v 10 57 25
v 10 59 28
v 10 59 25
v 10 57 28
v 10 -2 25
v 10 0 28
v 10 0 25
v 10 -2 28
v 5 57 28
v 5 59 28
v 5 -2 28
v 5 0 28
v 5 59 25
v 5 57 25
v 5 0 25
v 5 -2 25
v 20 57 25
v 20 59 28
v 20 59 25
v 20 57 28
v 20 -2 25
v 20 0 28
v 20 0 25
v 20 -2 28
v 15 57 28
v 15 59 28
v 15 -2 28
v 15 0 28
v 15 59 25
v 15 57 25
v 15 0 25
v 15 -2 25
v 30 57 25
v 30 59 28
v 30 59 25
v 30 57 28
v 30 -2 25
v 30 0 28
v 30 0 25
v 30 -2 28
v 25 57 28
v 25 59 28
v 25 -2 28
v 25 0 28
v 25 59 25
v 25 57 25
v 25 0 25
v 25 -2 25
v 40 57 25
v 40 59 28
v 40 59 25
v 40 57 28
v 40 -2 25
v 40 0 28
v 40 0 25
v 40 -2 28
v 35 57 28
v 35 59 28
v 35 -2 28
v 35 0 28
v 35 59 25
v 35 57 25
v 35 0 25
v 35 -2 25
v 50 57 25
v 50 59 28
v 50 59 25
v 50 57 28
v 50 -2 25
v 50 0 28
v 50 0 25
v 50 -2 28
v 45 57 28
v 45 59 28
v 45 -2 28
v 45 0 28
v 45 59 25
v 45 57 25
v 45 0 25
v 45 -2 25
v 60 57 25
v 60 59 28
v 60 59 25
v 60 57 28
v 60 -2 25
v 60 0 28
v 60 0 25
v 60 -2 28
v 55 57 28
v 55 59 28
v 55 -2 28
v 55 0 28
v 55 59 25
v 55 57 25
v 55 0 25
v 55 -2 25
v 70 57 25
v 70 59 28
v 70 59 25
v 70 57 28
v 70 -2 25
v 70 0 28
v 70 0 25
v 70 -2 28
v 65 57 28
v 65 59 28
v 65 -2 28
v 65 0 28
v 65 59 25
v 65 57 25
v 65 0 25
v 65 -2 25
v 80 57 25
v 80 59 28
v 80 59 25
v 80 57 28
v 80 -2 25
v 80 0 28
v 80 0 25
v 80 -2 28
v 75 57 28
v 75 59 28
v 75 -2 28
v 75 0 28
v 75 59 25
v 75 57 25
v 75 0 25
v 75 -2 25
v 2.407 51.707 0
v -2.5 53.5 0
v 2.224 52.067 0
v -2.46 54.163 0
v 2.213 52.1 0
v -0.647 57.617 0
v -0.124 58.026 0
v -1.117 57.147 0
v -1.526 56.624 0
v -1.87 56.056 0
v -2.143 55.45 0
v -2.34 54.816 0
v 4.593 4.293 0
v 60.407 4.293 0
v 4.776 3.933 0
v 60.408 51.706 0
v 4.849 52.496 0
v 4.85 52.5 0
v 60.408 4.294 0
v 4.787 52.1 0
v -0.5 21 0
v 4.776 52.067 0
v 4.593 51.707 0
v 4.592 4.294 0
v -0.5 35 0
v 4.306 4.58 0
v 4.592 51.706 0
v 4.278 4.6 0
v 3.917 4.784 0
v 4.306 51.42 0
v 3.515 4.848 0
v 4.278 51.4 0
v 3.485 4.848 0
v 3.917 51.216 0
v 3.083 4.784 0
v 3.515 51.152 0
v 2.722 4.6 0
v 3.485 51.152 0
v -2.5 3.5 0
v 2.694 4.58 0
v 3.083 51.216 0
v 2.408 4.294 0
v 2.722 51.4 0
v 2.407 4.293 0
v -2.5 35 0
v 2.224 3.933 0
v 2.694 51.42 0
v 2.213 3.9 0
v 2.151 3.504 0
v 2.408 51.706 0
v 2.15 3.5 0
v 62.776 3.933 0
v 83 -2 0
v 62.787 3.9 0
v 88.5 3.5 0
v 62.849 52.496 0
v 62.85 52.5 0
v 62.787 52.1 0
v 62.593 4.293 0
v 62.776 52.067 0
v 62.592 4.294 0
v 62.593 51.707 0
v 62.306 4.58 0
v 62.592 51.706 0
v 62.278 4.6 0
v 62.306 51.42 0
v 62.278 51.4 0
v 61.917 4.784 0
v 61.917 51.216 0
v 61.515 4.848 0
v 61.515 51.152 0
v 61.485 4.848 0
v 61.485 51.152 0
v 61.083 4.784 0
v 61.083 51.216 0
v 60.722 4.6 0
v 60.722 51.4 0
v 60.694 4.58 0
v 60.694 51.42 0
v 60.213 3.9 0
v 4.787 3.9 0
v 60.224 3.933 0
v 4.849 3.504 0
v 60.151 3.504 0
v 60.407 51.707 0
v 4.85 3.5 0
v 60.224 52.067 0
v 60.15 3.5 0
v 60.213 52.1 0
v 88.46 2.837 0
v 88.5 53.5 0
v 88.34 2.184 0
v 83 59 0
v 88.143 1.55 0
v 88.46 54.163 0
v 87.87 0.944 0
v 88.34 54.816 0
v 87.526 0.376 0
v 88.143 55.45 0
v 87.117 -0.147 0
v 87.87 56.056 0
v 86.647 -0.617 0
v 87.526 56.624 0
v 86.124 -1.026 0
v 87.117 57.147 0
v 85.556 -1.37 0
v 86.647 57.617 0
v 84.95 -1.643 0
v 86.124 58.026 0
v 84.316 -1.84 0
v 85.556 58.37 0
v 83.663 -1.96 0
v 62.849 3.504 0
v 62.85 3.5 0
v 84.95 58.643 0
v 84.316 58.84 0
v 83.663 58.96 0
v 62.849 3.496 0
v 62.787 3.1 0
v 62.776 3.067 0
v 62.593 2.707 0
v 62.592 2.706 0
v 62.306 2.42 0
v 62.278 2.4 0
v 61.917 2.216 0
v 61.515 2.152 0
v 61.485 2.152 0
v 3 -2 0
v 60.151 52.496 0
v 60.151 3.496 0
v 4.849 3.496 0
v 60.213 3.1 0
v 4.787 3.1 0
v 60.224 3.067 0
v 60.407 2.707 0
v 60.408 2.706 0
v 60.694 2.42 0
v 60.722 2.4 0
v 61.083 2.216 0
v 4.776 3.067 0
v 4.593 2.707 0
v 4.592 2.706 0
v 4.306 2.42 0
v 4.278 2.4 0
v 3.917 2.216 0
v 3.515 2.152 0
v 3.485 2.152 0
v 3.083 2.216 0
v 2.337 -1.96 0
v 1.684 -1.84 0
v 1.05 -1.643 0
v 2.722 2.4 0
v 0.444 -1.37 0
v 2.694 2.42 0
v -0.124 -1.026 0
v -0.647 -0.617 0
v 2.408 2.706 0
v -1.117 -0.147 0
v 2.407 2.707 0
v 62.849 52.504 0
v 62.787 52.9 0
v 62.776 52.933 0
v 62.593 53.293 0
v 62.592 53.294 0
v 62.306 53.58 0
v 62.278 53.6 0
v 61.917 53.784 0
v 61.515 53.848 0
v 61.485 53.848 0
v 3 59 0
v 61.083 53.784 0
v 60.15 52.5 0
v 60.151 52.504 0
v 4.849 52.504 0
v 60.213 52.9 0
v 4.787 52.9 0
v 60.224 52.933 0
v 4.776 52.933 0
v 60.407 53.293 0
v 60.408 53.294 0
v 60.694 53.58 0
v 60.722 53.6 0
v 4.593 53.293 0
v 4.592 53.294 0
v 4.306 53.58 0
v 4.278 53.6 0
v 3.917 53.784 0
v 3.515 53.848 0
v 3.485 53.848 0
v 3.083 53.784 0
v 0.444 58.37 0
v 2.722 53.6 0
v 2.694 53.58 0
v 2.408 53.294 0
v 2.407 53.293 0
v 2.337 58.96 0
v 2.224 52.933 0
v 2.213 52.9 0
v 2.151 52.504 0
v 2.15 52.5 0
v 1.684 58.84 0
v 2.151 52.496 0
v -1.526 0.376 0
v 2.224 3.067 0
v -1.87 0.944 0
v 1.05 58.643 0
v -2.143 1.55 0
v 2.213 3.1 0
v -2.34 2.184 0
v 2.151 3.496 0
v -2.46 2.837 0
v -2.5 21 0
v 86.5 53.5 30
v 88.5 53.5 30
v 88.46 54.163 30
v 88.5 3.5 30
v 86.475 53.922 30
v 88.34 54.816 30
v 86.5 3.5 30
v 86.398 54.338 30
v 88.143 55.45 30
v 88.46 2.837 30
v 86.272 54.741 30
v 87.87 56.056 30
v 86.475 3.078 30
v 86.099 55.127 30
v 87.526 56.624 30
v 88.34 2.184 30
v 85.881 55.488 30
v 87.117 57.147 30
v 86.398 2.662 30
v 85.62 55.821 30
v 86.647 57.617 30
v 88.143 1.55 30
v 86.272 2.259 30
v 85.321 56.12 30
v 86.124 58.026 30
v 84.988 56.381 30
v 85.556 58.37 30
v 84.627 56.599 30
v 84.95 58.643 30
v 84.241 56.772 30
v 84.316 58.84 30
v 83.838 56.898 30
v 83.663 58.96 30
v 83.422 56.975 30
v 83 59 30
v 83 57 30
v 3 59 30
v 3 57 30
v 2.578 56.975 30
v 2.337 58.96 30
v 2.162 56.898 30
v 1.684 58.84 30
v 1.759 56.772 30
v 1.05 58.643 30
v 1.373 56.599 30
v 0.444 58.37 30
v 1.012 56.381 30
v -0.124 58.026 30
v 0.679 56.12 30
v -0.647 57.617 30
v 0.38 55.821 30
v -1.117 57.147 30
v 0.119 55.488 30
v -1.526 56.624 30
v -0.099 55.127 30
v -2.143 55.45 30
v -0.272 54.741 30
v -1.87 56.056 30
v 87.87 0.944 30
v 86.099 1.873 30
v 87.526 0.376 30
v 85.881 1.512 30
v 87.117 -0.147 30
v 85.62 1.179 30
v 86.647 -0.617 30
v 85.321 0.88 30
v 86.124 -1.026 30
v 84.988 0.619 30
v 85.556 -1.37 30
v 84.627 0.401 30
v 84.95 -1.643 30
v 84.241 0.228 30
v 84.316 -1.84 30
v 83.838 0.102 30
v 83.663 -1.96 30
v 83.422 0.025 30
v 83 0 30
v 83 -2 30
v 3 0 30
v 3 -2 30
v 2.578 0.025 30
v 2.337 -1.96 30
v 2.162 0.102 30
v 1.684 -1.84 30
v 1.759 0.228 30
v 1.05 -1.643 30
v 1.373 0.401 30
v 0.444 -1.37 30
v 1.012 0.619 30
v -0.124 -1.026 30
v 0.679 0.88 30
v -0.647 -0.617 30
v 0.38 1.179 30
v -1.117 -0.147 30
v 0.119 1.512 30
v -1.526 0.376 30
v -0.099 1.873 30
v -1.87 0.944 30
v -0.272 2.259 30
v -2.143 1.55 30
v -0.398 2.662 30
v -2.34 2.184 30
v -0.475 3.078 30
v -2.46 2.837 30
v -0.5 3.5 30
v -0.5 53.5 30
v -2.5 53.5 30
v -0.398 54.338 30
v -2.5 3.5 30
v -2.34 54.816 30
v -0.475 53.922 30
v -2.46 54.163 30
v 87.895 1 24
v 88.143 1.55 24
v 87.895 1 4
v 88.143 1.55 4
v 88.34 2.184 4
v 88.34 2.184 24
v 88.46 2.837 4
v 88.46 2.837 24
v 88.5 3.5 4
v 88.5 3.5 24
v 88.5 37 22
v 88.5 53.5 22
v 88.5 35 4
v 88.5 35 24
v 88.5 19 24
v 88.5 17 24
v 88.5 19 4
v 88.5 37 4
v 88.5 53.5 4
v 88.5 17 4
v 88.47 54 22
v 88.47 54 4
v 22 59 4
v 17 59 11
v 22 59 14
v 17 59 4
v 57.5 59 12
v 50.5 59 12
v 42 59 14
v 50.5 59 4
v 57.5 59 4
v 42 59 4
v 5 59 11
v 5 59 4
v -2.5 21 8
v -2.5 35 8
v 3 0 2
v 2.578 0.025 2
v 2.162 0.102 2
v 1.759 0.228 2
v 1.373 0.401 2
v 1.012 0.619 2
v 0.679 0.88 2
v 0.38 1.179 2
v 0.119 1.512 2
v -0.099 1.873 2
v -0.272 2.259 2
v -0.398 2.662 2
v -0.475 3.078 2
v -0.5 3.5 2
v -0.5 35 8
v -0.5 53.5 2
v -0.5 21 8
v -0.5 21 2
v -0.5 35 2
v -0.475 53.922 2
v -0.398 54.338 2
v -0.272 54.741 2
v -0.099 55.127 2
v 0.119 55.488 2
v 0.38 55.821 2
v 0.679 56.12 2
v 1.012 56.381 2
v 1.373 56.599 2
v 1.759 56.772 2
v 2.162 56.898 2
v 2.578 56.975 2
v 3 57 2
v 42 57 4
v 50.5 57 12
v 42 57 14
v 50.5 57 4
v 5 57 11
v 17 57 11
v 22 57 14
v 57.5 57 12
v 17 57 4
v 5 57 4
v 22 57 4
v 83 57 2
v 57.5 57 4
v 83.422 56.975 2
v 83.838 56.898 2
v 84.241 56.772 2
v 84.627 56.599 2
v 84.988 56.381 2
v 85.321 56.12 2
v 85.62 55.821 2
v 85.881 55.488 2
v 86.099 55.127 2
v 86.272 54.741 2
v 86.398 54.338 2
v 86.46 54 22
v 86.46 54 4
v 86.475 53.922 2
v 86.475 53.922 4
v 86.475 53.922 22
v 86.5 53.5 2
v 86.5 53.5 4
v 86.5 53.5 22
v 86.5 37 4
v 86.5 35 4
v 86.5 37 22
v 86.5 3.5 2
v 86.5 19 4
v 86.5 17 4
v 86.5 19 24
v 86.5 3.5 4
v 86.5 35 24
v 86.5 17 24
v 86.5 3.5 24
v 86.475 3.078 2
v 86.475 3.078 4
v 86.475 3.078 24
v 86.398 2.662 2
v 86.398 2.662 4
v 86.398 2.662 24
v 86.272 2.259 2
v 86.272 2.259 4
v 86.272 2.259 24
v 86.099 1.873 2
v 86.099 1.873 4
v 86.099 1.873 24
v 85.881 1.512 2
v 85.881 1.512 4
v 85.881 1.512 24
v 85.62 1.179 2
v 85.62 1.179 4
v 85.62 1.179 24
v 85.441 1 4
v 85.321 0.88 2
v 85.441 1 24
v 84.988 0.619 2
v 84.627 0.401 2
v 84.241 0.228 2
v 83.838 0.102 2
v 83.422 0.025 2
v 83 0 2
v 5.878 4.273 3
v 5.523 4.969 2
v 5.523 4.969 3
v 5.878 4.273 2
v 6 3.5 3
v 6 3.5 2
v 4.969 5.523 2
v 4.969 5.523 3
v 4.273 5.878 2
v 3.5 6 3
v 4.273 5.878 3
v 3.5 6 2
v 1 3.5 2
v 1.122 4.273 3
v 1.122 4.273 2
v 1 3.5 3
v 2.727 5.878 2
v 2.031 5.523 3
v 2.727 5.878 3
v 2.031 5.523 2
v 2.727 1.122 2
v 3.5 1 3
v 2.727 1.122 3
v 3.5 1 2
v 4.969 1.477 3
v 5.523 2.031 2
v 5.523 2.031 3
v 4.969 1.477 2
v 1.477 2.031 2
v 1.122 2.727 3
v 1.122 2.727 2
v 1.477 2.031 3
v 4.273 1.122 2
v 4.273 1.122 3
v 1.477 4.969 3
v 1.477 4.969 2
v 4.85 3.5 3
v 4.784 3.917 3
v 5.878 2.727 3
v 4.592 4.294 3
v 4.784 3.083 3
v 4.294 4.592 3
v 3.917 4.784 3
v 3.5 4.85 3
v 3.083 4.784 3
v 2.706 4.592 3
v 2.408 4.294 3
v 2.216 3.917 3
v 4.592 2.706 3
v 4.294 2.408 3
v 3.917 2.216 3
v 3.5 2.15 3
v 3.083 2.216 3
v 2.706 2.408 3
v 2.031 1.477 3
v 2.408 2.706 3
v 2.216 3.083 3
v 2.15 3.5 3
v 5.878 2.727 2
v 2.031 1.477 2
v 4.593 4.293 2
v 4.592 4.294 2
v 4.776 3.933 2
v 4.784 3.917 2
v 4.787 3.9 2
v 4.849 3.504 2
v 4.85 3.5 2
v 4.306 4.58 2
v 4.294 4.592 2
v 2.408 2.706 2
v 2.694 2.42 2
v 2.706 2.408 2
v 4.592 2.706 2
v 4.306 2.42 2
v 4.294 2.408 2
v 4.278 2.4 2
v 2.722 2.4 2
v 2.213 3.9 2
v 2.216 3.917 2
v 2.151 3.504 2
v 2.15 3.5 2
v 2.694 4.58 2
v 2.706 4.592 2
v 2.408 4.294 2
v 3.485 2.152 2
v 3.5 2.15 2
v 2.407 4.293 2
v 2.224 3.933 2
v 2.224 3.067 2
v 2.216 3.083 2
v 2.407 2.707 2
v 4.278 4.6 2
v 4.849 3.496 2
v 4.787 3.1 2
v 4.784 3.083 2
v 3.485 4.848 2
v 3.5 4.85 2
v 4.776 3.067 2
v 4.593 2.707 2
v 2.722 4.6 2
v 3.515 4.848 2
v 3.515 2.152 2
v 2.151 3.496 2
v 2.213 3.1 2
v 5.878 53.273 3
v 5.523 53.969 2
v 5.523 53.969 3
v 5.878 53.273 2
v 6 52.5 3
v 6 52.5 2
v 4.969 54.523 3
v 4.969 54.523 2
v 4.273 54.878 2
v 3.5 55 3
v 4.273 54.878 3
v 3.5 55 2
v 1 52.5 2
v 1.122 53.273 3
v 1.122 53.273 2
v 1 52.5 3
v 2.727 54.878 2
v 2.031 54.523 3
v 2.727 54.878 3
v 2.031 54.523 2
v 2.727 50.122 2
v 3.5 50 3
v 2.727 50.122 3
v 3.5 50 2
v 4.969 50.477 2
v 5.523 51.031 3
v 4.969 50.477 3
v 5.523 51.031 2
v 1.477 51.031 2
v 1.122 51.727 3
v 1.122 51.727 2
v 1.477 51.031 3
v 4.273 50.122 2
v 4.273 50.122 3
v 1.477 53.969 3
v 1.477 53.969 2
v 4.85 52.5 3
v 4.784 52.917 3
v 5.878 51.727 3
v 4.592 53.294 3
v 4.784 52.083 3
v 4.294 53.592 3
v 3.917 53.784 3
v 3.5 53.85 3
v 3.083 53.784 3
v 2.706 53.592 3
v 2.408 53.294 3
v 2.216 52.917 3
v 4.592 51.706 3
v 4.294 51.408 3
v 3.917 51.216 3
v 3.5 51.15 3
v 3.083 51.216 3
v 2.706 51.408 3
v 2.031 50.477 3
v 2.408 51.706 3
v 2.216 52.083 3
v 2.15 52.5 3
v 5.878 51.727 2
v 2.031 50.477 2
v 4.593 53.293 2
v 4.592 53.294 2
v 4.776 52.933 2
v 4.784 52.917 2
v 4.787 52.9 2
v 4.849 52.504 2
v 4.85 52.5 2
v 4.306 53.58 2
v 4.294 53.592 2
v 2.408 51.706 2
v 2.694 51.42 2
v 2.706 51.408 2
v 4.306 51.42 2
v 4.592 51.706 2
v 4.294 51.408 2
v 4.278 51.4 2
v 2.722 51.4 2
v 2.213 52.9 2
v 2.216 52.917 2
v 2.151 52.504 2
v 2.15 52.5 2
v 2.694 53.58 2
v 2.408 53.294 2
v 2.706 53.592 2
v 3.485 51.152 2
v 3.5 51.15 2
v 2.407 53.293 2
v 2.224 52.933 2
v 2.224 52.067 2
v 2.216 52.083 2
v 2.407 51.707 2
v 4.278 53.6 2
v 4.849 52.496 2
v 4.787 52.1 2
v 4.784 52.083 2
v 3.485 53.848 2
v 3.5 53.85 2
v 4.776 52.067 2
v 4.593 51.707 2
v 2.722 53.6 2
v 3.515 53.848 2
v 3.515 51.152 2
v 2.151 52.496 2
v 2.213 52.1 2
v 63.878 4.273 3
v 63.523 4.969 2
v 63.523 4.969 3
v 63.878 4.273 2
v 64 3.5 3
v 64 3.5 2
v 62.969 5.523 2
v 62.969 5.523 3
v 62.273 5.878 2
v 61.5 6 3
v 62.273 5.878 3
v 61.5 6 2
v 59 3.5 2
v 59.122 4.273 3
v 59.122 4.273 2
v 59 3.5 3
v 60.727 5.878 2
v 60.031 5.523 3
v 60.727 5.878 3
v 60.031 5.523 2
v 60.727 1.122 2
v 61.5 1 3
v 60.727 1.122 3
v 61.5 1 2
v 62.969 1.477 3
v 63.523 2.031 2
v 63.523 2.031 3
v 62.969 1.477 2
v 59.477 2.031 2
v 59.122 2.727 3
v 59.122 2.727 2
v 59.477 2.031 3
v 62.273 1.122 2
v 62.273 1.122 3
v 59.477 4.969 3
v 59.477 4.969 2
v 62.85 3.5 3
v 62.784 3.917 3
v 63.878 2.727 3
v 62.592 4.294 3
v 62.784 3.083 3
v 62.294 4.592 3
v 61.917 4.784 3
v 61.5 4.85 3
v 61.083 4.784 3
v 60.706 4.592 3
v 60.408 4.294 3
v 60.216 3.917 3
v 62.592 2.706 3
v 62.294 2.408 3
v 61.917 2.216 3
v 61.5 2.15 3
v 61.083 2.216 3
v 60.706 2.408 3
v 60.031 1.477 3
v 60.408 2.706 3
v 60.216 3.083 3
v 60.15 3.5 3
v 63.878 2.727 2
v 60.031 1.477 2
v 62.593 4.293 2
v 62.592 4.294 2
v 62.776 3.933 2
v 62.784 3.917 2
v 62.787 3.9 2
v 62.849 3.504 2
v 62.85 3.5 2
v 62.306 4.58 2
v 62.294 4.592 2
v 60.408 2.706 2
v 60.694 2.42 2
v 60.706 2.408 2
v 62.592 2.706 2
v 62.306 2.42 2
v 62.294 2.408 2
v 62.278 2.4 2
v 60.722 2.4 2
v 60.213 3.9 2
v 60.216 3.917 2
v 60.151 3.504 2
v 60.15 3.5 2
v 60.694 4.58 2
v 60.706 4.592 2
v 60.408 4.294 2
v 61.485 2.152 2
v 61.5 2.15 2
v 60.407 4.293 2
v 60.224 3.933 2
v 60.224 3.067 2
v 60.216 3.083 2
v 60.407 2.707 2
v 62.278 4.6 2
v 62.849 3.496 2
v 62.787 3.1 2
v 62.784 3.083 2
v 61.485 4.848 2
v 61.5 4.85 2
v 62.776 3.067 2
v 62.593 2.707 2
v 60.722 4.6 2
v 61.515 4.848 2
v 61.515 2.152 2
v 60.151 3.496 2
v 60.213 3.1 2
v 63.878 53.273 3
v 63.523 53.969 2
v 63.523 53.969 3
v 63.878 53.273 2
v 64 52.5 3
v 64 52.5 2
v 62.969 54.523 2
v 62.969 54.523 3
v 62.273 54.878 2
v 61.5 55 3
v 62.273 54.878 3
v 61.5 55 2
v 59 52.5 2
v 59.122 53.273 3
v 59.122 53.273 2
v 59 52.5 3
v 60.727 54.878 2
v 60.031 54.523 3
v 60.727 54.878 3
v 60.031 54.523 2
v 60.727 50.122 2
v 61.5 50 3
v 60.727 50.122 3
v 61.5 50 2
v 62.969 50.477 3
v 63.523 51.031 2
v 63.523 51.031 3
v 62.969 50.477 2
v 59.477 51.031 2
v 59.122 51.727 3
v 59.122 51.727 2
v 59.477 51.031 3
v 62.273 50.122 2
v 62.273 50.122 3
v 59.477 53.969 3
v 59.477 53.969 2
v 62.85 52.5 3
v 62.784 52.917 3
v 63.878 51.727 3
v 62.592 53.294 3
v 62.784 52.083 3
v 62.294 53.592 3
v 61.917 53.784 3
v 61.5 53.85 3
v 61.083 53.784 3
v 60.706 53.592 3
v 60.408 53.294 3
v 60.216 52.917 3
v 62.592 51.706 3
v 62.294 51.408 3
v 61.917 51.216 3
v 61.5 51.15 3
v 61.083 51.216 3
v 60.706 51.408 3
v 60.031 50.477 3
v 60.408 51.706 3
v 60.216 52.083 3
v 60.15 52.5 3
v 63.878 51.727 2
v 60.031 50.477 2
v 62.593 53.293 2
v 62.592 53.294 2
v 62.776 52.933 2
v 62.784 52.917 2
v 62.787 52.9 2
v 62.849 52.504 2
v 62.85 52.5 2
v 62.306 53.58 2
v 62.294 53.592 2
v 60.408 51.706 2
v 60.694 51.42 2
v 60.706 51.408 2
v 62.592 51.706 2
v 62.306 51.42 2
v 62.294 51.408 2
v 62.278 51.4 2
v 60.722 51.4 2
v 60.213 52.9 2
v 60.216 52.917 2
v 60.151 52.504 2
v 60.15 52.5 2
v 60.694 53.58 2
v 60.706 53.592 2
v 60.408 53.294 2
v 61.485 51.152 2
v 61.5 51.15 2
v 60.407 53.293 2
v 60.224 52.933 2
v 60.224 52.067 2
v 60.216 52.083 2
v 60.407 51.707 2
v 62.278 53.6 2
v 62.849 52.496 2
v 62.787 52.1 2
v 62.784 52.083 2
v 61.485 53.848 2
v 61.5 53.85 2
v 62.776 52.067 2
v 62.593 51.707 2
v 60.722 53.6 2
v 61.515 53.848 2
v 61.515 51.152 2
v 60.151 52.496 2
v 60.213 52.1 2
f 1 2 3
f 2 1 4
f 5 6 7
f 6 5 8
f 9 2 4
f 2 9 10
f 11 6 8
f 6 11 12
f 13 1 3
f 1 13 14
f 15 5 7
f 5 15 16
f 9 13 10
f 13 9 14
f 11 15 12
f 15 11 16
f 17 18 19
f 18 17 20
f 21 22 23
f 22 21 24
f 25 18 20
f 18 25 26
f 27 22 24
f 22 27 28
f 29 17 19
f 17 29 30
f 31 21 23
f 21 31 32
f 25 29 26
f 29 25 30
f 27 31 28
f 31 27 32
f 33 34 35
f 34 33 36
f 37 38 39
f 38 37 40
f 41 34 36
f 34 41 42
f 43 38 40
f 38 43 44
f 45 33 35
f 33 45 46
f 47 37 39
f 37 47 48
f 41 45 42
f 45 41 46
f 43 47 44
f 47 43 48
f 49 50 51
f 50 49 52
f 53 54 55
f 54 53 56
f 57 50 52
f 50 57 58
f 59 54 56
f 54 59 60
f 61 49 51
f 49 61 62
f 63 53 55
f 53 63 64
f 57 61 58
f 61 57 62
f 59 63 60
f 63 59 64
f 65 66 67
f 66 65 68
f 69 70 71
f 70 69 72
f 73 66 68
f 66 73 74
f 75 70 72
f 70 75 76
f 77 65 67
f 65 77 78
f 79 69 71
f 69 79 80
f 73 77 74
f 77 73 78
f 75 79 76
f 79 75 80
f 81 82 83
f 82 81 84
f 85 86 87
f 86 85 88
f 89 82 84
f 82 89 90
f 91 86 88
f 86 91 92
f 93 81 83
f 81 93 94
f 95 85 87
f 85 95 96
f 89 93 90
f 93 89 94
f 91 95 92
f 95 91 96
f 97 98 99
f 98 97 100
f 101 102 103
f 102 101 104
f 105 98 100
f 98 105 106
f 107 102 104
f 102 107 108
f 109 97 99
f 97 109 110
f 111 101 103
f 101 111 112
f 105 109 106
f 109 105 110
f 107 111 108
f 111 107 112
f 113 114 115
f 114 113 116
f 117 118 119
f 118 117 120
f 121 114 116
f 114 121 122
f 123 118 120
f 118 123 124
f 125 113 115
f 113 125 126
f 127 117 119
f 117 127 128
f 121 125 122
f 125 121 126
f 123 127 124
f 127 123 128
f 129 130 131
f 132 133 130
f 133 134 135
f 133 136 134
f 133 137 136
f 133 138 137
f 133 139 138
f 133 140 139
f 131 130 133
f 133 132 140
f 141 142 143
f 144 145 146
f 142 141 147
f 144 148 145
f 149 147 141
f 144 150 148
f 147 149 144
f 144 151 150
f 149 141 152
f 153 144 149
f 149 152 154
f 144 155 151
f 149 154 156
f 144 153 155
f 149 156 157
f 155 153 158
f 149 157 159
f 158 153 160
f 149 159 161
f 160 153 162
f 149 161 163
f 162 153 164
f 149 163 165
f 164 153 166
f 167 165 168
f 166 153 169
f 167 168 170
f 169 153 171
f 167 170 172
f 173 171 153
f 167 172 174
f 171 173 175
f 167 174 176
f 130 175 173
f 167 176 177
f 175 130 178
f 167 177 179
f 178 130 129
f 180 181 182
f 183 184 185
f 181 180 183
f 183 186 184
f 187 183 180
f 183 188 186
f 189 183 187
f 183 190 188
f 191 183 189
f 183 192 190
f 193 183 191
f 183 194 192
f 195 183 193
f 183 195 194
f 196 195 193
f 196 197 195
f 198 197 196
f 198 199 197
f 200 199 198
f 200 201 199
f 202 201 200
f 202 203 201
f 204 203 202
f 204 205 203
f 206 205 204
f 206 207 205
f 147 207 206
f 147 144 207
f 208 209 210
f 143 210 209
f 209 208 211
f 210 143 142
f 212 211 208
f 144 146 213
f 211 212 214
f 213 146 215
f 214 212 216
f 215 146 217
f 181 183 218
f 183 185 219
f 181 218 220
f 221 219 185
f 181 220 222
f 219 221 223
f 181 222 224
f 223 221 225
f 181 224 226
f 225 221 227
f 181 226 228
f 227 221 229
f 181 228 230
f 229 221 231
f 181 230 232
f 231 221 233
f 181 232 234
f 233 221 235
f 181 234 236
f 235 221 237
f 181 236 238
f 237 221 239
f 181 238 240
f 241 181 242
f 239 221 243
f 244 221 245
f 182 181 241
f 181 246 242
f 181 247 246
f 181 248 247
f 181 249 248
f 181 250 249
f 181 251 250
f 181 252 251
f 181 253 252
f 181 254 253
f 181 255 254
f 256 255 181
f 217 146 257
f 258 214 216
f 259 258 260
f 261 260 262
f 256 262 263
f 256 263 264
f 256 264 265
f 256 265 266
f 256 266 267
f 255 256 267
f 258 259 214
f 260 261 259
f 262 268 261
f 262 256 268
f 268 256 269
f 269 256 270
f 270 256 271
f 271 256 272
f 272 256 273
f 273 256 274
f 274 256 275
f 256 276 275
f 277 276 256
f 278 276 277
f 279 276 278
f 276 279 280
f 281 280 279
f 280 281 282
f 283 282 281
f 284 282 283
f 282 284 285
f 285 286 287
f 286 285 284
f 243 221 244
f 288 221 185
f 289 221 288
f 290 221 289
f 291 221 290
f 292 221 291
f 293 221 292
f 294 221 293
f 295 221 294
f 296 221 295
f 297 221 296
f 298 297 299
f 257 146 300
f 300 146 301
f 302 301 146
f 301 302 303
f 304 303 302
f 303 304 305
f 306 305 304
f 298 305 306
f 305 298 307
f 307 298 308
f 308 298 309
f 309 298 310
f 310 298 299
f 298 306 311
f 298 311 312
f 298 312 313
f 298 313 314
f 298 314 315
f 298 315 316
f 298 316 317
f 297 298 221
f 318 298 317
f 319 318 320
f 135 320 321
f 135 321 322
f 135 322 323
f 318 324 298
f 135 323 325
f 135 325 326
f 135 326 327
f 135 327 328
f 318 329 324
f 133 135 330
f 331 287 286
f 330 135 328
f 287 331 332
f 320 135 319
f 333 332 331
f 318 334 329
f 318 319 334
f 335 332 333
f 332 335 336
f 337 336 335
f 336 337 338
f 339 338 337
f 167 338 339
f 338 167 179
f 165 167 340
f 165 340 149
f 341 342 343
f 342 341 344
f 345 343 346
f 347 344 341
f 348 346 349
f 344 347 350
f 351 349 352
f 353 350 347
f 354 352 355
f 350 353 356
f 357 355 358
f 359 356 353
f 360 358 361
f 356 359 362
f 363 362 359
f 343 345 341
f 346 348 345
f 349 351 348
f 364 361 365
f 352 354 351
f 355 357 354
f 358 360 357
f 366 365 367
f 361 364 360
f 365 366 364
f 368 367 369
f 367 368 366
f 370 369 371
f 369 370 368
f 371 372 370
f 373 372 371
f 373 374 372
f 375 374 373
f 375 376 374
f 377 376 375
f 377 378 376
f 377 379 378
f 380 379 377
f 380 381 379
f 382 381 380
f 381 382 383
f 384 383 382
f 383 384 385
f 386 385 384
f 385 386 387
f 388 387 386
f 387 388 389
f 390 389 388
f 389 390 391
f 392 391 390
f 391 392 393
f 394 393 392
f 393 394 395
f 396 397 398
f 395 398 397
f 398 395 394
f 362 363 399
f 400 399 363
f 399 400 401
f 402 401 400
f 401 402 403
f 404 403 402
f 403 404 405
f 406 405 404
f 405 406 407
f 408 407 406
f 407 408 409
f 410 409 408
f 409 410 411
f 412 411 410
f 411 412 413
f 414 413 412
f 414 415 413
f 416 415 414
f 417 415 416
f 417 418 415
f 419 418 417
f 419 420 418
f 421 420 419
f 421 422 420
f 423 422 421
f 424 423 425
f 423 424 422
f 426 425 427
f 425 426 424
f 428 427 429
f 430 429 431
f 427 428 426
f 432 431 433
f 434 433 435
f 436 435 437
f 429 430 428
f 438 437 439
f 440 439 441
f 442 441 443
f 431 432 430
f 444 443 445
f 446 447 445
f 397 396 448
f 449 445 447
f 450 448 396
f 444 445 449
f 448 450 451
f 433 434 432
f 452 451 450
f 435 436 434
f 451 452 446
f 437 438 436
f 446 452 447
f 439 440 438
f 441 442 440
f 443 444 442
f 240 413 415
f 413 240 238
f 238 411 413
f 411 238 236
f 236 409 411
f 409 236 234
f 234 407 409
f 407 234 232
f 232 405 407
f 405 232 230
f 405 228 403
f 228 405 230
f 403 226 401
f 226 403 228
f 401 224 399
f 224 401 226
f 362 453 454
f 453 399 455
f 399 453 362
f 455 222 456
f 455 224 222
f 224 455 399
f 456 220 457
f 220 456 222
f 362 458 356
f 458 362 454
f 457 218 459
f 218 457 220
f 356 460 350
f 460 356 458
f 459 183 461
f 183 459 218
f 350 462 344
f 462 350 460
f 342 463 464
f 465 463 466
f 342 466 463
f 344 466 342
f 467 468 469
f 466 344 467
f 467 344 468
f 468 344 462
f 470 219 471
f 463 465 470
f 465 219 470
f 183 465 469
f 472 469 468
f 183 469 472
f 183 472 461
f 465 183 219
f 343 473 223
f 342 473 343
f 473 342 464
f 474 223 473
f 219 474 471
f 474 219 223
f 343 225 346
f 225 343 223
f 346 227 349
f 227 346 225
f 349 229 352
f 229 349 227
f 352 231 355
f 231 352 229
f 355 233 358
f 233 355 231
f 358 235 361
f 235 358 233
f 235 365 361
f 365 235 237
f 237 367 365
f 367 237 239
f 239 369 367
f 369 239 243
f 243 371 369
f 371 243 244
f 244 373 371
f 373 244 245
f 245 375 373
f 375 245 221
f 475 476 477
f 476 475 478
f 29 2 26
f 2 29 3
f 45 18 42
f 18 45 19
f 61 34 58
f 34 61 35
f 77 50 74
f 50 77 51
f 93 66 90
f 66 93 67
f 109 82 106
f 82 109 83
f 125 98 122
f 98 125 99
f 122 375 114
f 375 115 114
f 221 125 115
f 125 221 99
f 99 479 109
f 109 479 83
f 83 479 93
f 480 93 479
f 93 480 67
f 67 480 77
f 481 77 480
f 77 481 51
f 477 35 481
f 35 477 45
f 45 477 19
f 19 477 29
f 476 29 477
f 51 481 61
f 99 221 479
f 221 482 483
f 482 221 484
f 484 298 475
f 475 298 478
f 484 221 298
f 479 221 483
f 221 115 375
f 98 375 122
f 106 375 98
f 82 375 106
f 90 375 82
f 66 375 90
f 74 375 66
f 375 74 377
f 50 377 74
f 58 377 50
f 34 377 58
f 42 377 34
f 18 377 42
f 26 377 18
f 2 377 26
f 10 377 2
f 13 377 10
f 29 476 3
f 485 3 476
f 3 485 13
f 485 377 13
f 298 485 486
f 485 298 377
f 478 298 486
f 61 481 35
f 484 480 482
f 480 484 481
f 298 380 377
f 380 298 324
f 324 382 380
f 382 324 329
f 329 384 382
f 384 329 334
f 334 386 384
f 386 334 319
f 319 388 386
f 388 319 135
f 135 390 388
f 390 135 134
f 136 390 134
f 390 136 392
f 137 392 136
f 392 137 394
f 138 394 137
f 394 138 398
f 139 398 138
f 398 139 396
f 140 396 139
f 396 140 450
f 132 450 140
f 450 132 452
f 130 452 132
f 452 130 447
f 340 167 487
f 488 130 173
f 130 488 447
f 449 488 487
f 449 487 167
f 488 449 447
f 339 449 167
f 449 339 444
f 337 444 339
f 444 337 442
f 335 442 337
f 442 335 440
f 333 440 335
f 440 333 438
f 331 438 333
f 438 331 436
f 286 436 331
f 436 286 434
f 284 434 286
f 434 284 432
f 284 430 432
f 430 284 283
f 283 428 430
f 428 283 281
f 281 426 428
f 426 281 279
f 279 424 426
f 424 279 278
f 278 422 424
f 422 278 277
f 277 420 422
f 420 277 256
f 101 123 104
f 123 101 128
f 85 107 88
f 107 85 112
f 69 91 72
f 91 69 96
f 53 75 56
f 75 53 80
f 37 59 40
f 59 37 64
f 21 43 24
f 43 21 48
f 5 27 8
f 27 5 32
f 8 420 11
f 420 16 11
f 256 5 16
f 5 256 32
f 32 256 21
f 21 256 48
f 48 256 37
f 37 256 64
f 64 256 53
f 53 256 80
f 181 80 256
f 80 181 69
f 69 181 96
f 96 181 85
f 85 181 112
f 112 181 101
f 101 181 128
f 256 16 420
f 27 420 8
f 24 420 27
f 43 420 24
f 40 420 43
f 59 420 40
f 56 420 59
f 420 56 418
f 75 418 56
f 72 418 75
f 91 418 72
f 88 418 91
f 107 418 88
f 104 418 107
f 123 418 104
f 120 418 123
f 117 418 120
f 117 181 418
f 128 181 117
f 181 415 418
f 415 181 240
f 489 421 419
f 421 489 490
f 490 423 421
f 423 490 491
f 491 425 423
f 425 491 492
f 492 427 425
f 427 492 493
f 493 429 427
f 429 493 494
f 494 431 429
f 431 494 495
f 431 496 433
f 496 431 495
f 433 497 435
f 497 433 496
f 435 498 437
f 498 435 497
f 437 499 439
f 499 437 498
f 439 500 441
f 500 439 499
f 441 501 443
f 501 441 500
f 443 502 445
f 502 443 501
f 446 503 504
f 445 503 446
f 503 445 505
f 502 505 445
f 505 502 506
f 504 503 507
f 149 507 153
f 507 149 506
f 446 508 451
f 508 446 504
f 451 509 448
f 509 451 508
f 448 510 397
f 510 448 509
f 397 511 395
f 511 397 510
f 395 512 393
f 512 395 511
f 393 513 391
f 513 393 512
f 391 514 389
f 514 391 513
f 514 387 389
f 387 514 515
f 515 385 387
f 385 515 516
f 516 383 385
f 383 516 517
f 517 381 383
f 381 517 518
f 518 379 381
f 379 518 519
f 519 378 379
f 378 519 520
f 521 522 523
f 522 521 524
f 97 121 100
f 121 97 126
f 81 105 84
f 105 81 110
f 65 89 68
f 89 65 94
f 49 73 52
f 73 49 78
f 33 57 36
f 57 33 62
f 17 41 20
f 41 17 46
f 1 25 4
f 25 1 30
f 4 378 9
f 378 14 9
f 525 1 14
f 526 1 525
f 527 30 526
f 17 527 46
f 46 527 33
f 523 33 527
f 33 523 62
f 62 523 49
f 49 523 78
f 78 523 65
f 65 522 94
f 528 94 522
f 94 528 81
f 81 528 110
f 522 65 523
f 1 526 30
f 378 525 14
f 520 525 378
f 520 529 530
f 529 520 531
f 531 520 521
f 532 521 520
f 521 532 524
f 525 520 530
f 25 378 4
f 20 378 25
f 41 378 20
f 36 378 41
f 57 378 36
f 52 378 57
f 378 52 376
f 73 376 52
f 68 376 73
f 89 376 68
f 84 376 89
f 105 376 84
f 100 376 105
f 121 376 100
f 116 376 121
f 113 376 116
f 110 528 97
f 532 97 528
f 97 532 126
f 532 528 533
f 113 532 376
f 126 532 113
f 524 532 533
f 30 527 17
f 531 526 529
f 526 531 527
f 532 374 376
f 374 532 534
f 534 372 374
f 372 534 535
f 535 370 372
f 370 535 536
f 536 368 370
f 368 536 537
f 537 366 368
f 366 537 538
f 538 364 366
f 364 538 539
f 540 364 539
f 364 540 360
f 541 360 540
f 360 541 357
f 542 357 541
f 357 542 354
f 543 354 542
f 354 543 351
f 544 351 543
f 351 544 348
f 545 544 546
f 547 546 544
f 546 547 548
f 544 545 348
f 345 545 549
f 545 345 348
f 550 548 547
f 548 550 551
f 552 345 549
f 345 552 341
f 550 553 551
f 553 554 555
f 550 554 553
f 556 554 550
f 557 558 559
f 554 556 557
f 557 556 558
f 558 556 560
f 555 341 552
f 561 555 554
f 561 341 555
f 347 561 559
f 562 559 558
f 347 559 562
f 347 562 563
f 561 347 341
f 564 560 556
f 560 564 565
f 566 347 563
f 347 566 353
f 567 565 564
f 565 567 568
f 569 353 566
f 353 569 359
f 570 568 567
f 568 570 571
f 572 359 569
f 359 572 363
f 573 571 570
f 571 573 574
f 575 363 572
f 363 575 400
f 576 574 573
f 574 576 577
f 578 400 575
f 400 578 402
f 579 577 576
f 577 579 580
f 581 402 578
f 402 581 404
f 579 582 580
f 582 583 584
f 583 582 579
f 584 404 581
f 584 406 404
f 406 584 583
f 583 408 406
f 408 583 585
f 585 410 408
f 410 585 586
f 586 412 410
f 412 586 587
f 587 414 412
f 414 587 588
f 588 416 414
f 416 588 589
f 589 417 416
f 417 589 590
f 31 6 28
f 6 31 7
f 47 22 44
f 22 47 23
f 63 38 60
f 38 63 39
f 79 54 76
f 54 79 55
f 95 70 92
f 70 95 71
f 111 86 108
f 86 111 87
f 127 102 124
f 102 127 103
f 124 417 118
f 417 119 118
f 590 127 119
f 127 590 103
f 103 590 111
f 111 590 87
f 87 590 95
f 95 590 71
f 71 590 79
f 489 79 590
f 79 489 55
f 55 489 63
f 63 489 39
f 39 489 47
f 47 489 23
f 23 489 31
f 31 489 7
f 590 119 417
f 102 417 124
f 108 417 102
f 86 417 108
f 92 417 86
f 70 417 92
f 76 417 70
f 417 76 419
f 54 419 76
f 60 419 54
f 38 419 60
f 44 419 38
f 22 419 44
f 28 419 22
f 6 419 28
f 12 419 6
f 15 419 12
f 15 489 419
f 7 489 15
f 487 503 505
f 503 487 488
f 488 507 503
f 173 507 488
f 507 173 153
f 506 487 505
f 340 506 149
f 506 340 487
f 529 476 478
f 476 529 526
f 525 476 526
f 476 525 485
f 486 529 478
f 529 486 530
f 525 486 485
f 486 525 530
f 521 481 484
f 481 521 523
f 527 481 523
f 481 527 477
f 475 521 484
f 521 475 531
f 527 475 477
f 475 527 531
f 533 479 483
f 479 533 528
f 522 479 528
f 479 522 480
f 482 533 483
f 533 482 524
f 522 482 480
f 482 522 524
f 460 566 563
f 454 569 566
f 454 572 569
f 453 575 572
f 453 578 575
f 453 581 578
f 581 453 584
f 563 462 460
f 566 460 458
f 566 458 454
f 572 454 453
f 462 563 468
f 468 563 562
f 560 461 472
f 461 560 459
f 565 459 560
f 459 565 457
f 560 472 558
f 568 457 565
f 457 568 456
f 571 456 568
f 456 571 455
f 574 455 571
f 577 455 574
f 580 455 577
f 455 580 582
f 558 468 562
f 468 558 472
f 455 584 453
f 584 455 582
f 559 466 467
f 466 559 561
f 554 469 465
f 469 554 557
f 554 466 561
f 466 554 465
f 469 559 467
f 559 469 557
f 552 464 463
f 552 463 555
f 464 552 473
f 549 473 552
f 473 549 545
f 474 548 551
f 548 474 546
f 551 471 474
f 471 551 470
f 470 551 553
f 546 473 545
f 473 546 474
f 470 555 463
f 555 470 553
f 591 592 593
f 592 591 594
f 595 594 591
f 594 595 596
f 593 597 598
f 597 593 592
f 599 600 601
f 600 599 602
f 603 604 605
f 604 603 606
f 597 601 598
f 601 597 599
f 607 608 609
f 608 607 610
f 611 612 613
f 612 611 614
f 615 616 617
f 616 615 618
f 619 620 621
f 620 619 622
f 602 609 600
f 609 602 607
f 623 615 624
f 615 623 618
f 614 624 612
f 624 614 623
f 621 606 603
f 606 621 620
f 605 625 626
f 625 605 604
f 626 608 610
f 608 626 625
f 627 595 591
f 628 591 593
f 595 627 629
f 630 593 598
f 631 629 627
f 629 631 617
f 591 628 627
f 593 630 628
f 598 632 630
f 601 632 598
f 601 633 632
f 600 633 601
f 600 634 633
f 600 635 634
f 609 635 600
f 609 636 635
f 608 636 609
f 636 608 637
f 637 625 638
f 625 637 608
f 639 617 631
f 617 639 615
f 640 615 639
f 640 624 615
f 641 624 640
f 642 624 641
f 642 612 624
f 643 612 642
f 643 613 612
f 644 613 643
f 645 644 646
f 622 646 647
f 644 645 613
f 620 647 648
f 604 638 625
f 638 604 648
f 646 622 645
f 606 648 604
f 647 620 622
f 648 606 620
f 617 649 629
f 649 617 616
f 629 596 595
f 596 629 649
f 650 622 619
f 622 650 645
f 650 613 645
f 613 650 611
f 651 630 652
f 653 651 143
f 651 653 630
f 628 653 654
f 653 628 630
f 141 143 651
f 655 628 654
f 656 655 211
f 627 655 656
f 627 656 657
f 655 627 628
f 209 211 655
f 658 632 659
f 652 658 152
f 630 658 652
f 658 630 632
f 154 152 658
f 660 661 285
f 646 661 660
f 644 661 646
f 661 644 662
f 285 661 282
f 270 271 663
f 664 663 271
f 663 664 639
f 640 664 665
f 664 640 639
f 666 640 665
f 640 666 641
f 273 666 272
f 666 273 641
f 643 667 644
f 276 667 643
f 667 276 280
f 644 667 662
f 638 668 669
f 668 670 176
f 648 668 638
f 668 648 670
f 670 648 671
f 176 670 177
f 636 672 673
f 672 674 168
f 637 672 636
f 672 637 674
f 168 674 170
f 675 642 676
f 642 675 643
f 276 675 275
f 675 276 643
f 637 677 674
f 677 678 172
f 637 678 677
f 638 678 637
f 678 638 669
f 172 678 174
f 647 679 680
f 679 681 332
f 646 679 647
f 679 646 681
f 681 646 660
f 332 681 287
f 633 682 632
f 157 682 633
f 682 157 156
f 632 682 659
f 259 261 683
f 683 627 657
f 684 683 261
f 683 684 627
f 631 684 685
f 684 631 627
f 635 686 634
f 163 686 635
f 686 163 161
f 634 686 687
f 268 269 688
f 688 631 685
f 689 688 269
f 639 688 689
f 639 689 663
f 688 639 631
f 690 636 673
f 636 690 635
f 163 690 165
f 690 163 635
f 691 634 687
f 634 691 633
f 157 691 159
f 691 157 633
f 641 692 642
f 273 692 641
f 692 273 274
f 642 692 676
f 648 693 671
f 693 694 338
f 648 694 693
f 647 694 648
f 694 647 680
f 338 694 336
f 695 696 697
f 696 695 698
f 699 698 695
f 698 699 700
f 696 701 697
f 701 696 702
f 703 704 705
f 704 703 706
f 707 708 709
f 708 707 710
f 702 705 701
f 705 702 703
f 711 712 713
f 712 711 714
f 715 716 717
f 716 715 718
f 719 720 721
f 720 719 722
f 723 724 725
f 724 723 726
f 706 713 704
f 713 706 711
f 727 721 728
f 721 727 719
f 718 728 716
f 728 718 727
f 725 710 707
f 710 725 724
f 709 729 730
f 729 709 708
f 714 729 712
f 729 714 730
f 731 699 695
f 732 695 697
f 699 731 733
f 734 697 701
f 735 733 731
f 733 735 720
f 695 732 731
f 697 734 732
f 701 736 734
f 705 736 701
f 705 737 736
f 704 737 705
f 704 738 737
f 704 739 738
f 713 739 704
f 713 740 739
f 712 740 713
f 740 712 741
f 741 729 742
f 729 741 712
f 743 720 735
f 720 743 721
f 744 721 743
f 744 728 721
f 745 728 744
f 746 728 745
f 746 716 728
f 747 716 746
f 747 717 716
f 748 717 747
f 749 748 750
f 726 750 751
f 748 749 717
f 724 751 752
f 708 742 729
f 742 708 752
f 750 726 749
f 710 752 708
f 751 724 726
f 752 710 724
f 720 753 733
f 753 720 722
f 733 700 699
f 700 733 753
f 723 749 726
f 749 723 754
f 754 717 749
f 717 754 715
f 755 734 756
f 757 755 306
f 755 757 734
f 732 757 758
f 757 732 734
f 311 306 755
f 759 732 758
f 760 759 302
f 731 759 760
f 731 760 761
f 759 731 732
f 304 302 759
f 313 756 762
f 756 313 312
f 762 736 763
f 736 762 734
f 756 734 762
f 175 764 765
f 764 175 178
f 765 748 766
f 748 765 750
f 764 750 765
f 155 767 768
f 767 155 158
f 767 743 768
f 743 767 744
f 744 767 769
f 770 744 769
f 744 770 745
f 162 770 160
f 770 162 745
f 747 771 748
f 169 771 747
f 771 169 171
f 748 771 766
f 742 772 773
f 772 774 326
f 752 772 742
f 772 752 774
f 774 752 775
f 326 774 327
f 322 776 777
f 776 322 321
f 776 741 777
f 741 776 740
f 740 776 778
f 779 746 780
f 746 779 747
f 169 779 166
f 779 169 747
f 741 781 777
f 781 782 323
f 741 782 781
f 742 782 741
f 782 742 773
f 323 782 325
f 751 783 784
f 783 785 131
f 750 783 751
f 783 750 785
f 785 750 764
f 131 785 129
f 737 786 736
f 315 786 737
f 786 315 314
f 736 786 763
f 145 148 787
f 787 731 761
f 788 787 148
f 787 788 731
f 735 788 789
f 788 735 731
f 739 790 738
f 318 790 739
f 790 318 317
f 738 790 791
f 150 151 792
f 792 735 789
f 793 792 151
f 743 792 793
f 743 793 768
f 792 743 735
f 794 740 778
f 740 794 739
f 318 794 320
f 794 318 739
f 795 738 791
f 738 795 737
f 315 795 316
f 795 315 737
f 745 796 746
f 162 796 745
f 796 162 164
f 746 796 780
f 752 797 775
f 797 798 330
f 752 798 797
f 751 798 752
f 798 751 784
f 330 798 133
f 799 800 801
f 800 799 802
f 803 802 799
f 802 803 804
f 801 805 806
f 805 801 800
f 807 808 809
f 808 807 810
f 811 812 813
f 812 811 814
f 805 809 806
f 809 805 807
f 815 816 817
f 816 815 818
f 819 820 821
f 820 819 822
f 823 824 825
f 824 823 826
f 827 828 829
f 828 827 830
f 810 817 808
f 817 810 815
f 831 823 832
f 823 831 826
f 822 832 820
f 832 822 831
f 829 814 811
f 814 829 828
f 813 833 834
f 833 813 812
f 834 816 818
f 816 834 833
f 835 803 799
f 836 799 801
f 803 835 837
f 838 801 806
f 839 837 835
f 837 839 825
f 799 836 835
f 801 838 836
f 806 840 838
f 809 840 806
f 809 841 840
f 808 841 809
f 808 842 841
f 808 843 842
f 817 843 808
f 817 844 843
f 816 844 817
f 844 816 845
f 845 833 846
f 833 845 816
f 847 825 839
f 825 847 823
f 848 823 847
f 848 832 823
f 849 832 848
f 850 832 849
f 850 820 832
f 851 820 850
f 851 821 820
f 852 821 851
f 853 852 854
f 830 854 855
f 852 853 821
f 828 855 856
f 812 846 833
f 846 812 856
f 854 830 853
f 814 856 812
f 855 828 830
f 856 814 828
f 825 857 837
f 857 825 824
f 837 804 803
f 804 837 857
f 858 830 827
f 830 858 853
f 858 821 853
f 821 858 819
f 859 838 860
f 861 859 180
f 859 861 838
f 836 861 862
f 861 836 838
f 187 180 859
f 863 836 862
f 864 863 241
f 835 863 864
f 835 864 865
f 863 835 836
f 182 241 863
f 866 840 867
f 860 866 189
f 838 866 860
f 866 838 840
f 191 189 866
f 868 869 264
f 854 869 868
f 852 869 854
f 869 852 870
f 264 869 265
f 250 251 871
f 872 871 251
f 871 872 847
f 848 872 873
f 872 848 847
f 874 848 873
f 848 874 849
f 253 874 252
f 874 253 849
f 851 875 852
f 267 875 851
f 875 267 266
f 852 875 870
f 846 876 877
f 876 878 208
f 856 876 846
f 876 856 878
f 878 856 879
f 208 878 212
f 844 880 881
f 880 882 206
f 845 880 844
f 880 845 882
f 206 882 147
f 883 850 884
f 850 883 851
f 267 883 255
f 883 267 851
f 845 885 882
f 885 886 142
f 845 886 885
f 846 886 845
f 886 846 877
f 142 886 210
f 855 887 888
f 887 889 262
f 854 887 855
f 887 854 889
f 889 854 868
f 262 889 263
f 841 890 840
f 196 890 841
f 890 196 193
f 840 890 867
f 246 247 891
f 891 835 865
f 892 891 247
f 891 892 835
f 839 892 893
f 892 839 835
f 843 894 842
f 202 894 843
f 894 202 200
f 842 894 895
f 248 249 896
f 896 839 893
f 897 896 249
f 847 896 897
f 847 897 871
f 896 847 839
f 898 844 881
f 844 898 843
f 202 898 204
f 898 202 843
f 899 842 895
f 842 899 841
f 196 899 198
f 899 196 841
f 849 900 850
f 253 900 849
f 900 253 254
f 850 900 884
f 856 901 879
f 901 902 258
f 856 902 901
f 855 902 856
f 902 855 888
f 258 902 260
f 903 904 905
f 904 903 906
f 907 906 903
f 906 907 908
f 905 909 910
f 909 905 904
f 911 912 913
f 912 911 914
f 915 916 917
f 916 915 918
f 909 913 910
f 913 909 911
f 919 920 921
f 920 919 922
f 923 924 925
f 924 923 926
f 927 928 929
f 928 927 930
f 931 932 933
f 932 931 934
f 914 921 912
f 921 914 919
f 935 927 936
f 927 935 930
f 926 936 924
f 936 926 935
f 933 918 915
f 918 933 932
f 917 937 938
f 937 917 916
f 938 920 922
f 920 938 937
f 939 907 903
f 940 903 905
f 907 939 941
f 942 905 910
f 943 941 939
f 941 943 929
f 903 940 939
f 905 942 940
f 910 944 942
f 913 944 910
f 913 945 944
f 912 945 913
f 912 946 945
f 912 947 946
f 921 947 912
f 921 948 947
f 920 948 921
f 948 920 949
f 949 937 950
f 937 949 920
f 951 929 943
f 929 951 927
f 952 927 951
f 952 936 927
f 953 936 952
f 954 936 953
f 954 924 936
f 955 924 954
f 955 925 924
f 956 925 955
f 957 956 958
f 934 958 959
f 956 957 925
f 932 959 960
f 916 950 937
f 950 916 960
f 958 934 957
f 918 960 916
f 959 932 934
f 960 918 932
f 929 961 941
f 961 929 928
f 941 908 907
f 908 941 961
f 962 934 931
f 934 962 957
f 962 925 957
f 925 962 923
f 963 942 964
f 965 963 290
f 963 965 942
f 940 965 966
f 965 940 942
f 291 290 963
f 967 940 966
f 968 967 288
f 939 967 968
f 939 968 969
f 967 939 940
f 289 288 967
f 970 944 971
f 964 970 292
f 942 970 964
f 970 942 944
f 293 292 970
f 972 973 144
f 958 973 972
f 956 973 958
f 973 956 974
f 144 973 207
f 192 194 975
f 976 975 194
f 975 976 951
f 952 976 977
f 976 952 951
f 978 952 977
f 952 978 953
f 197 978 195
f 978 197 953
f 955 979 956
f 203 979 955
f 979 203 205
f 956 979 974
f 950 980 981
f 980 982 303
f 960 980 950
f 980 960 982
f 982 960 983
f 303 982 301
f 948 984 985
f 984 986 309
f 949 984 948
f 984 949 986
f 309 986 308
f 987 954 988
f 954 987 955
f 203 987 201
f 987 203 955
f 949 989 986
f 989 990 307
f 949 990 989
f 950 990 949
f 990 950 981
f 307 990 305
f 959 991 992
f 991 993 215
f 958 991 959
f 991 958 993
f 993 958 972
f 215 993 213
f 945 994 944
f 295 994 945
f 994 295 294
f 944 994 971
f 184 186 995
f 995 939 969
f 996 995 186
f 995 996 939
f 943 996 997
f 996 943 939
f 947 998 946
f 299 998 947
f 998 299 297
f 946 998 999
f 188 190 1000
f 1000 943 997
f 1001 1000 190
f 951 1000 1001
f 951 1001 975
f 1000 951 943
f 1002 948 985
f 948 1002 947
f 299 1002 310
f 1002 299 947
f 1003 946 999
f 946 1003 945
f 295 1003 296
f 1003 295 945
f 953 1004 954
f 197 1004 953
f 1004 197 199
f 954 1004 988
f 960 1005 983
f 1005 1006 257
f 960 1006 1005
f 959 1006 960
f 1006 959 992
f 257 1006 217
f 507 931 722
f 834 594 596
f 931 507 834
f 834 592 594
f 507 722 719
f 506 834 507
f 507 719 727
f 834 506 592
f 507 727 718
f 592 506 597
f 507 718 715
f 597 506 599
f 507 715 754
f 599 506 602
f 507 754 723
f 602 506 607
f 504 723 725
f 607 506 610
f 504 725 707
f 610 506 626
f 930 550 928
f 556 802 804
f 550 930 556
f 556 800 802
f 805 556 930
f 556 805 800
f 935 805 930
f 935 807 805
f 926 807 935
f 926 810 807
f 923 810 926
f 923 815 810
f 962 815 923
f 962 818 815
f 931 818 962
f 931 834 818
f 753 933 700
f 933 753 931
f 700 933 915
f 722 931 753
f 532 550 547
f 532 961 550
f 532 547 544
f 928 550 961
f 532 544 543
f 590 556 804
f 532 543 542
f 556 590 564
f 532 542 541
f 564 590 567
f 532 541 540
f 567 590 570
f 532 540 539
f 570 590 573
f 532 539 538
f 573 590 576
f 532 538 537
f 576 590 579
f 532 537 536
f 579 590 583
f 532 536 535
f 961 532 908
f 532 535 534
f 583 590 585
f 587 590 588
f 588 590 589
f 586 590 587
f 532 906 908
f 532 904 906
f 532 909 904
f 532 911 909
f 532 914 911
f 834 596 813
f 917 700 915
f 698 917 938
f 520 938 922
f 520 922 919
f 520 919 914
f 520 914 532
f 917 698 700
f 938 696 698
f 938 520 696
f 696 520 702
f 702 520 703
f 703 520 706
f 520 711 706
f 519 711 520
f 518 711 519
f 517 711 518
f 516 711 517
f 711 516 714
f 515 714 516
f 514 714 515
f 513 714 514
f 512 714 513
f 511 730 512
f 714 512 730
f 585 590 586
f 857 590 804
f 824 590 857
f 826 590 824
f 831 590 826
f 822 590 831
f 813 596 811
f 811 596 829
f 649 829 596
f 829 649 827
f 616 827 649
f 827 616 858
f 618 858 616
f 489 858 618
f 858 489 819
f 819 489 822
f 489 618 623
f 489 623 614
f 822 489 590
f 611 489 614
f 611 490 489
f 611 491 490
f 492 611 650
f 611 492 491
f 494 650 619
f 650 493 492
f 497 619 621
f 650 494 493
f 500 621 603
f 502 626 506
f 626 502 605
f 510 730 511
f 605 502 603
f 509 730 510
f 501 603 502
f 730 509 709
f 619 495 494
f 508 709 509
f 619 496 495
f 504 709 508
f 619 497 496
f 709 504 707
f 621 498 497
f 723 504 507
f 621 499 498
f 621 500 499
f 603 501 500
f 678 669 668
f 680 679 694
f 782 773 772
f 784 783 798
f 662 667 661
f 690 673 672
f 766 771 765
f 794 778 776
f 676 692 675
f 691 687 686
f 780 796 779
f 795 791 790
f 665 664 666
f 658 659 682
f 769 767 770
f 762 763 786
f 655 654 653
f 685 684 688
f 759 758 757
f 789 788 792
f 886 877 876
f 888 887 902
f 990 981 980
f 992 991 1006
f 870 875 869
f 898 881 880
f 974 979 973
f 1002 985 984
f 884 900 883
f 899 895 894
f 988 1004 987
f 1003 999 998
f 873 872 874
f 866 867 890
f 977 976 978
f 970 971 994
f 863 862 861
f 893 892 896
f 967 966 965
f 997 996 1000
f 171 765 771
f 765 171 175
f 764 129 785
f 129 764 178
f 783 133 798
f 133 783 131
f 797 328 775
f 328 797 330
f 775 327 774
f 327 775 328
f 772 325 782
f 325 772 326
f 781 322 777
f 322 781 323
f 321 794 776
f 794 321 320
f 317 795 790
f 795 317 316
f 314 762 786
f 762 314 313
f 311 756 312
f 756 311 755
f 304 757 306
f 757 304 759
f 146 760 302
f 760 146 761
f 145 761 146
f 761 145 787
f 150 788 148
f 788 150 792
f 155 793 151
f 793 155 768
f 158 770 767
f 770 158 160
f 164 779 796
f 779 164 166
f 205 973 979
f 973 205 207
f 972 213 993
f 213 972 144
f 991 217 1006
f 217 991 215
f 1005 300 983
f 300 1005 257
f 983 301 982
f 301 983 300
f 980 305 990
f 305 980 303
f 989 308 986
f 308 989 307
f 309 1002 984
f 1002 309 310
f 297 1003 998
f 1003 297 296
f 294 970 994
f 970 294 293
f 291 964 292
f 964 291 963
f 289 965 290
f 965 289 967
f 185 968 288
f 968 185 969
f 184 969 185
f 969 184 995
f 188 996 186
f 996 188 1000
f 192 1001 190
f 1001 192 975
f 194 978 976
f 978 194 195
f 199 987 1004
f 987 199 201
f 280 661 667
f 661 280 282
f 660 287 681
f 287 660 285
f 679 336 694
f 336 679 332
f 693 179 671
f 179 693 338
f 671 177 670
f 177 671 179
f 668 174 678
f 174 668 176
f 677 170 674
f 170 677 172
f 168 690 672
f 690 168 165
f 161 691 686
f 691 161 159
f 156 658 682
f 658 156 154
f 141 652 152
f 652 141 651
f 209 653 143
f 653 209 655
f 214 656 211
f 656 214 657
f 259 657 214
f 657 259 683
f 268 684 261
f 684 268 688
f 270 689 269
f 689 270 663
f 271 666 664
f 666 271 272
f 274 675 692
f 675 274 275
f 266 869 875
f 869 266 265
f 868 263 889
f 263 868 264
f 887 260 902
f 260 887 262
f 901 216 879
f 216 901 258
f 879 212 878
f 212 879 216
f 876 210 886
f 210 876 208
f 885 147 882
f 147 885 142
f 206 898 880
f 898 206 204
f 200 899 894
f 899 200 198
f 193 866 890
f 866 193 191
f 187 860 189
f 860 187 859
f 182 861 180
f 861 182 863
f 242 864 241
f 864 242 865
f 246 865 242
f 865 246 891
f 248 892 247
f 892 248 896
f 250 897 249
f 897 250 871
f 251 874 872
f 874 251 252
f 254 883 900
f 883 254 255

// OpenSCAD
linear_extrude(2)
	import("../dxf/RPi_3B.dxf", $fn=50);
difference(){
linear_extrude(30)
	import("../dxf/RPi_3B_out.dxf", $fn=50);
//SD card
translate([-8,21,-2])
	cube([10,14,10]);

//power\hdmi\audio
translate([5,55,4])
	cube([12,10,7]);

translate([22,55,4])
	cube([20,10,10]);

translate([50.5,55,4])
	cube([7,10,8]);

//net\USB
translate([80,1,4])
	cube([10,16,20]);

translate([80,19,4])
	cube([10,16,20]);

translate([80,37,4])
	cube([10,17,18]);

//top holes
for (i =[5:10:75]){
	translate([(i),-5,25])
		cube([5,70,3]);
	}

}


//support fo 2.5mm scolls
//*
height = 3;
translate([3.5,3.5,0])
difference(){
		cylinder(height,2.5,2.5, $fn=20);
		cylinder(12,1.35,1.35, $fn=20);
}

translate([3.5,52.5,0])
difference(){
		cylinder(height,2.5,2.5, $fn=20);
		cylinder(12,1.35,1.35, $fn=20);
}

translate([61.5,3.5,0])
difference(){
		cylinder(height,2.5,2.5, $fn=20);
		cylinder(12,1.35,1.35, $fn=20);
}

translate([61.5,52.5,0])
difference(){
		cylinder(height,2.5,2.5, $fn=20);
		cylinder(12,1.35,1.35, $fn=20);
}
//*/
